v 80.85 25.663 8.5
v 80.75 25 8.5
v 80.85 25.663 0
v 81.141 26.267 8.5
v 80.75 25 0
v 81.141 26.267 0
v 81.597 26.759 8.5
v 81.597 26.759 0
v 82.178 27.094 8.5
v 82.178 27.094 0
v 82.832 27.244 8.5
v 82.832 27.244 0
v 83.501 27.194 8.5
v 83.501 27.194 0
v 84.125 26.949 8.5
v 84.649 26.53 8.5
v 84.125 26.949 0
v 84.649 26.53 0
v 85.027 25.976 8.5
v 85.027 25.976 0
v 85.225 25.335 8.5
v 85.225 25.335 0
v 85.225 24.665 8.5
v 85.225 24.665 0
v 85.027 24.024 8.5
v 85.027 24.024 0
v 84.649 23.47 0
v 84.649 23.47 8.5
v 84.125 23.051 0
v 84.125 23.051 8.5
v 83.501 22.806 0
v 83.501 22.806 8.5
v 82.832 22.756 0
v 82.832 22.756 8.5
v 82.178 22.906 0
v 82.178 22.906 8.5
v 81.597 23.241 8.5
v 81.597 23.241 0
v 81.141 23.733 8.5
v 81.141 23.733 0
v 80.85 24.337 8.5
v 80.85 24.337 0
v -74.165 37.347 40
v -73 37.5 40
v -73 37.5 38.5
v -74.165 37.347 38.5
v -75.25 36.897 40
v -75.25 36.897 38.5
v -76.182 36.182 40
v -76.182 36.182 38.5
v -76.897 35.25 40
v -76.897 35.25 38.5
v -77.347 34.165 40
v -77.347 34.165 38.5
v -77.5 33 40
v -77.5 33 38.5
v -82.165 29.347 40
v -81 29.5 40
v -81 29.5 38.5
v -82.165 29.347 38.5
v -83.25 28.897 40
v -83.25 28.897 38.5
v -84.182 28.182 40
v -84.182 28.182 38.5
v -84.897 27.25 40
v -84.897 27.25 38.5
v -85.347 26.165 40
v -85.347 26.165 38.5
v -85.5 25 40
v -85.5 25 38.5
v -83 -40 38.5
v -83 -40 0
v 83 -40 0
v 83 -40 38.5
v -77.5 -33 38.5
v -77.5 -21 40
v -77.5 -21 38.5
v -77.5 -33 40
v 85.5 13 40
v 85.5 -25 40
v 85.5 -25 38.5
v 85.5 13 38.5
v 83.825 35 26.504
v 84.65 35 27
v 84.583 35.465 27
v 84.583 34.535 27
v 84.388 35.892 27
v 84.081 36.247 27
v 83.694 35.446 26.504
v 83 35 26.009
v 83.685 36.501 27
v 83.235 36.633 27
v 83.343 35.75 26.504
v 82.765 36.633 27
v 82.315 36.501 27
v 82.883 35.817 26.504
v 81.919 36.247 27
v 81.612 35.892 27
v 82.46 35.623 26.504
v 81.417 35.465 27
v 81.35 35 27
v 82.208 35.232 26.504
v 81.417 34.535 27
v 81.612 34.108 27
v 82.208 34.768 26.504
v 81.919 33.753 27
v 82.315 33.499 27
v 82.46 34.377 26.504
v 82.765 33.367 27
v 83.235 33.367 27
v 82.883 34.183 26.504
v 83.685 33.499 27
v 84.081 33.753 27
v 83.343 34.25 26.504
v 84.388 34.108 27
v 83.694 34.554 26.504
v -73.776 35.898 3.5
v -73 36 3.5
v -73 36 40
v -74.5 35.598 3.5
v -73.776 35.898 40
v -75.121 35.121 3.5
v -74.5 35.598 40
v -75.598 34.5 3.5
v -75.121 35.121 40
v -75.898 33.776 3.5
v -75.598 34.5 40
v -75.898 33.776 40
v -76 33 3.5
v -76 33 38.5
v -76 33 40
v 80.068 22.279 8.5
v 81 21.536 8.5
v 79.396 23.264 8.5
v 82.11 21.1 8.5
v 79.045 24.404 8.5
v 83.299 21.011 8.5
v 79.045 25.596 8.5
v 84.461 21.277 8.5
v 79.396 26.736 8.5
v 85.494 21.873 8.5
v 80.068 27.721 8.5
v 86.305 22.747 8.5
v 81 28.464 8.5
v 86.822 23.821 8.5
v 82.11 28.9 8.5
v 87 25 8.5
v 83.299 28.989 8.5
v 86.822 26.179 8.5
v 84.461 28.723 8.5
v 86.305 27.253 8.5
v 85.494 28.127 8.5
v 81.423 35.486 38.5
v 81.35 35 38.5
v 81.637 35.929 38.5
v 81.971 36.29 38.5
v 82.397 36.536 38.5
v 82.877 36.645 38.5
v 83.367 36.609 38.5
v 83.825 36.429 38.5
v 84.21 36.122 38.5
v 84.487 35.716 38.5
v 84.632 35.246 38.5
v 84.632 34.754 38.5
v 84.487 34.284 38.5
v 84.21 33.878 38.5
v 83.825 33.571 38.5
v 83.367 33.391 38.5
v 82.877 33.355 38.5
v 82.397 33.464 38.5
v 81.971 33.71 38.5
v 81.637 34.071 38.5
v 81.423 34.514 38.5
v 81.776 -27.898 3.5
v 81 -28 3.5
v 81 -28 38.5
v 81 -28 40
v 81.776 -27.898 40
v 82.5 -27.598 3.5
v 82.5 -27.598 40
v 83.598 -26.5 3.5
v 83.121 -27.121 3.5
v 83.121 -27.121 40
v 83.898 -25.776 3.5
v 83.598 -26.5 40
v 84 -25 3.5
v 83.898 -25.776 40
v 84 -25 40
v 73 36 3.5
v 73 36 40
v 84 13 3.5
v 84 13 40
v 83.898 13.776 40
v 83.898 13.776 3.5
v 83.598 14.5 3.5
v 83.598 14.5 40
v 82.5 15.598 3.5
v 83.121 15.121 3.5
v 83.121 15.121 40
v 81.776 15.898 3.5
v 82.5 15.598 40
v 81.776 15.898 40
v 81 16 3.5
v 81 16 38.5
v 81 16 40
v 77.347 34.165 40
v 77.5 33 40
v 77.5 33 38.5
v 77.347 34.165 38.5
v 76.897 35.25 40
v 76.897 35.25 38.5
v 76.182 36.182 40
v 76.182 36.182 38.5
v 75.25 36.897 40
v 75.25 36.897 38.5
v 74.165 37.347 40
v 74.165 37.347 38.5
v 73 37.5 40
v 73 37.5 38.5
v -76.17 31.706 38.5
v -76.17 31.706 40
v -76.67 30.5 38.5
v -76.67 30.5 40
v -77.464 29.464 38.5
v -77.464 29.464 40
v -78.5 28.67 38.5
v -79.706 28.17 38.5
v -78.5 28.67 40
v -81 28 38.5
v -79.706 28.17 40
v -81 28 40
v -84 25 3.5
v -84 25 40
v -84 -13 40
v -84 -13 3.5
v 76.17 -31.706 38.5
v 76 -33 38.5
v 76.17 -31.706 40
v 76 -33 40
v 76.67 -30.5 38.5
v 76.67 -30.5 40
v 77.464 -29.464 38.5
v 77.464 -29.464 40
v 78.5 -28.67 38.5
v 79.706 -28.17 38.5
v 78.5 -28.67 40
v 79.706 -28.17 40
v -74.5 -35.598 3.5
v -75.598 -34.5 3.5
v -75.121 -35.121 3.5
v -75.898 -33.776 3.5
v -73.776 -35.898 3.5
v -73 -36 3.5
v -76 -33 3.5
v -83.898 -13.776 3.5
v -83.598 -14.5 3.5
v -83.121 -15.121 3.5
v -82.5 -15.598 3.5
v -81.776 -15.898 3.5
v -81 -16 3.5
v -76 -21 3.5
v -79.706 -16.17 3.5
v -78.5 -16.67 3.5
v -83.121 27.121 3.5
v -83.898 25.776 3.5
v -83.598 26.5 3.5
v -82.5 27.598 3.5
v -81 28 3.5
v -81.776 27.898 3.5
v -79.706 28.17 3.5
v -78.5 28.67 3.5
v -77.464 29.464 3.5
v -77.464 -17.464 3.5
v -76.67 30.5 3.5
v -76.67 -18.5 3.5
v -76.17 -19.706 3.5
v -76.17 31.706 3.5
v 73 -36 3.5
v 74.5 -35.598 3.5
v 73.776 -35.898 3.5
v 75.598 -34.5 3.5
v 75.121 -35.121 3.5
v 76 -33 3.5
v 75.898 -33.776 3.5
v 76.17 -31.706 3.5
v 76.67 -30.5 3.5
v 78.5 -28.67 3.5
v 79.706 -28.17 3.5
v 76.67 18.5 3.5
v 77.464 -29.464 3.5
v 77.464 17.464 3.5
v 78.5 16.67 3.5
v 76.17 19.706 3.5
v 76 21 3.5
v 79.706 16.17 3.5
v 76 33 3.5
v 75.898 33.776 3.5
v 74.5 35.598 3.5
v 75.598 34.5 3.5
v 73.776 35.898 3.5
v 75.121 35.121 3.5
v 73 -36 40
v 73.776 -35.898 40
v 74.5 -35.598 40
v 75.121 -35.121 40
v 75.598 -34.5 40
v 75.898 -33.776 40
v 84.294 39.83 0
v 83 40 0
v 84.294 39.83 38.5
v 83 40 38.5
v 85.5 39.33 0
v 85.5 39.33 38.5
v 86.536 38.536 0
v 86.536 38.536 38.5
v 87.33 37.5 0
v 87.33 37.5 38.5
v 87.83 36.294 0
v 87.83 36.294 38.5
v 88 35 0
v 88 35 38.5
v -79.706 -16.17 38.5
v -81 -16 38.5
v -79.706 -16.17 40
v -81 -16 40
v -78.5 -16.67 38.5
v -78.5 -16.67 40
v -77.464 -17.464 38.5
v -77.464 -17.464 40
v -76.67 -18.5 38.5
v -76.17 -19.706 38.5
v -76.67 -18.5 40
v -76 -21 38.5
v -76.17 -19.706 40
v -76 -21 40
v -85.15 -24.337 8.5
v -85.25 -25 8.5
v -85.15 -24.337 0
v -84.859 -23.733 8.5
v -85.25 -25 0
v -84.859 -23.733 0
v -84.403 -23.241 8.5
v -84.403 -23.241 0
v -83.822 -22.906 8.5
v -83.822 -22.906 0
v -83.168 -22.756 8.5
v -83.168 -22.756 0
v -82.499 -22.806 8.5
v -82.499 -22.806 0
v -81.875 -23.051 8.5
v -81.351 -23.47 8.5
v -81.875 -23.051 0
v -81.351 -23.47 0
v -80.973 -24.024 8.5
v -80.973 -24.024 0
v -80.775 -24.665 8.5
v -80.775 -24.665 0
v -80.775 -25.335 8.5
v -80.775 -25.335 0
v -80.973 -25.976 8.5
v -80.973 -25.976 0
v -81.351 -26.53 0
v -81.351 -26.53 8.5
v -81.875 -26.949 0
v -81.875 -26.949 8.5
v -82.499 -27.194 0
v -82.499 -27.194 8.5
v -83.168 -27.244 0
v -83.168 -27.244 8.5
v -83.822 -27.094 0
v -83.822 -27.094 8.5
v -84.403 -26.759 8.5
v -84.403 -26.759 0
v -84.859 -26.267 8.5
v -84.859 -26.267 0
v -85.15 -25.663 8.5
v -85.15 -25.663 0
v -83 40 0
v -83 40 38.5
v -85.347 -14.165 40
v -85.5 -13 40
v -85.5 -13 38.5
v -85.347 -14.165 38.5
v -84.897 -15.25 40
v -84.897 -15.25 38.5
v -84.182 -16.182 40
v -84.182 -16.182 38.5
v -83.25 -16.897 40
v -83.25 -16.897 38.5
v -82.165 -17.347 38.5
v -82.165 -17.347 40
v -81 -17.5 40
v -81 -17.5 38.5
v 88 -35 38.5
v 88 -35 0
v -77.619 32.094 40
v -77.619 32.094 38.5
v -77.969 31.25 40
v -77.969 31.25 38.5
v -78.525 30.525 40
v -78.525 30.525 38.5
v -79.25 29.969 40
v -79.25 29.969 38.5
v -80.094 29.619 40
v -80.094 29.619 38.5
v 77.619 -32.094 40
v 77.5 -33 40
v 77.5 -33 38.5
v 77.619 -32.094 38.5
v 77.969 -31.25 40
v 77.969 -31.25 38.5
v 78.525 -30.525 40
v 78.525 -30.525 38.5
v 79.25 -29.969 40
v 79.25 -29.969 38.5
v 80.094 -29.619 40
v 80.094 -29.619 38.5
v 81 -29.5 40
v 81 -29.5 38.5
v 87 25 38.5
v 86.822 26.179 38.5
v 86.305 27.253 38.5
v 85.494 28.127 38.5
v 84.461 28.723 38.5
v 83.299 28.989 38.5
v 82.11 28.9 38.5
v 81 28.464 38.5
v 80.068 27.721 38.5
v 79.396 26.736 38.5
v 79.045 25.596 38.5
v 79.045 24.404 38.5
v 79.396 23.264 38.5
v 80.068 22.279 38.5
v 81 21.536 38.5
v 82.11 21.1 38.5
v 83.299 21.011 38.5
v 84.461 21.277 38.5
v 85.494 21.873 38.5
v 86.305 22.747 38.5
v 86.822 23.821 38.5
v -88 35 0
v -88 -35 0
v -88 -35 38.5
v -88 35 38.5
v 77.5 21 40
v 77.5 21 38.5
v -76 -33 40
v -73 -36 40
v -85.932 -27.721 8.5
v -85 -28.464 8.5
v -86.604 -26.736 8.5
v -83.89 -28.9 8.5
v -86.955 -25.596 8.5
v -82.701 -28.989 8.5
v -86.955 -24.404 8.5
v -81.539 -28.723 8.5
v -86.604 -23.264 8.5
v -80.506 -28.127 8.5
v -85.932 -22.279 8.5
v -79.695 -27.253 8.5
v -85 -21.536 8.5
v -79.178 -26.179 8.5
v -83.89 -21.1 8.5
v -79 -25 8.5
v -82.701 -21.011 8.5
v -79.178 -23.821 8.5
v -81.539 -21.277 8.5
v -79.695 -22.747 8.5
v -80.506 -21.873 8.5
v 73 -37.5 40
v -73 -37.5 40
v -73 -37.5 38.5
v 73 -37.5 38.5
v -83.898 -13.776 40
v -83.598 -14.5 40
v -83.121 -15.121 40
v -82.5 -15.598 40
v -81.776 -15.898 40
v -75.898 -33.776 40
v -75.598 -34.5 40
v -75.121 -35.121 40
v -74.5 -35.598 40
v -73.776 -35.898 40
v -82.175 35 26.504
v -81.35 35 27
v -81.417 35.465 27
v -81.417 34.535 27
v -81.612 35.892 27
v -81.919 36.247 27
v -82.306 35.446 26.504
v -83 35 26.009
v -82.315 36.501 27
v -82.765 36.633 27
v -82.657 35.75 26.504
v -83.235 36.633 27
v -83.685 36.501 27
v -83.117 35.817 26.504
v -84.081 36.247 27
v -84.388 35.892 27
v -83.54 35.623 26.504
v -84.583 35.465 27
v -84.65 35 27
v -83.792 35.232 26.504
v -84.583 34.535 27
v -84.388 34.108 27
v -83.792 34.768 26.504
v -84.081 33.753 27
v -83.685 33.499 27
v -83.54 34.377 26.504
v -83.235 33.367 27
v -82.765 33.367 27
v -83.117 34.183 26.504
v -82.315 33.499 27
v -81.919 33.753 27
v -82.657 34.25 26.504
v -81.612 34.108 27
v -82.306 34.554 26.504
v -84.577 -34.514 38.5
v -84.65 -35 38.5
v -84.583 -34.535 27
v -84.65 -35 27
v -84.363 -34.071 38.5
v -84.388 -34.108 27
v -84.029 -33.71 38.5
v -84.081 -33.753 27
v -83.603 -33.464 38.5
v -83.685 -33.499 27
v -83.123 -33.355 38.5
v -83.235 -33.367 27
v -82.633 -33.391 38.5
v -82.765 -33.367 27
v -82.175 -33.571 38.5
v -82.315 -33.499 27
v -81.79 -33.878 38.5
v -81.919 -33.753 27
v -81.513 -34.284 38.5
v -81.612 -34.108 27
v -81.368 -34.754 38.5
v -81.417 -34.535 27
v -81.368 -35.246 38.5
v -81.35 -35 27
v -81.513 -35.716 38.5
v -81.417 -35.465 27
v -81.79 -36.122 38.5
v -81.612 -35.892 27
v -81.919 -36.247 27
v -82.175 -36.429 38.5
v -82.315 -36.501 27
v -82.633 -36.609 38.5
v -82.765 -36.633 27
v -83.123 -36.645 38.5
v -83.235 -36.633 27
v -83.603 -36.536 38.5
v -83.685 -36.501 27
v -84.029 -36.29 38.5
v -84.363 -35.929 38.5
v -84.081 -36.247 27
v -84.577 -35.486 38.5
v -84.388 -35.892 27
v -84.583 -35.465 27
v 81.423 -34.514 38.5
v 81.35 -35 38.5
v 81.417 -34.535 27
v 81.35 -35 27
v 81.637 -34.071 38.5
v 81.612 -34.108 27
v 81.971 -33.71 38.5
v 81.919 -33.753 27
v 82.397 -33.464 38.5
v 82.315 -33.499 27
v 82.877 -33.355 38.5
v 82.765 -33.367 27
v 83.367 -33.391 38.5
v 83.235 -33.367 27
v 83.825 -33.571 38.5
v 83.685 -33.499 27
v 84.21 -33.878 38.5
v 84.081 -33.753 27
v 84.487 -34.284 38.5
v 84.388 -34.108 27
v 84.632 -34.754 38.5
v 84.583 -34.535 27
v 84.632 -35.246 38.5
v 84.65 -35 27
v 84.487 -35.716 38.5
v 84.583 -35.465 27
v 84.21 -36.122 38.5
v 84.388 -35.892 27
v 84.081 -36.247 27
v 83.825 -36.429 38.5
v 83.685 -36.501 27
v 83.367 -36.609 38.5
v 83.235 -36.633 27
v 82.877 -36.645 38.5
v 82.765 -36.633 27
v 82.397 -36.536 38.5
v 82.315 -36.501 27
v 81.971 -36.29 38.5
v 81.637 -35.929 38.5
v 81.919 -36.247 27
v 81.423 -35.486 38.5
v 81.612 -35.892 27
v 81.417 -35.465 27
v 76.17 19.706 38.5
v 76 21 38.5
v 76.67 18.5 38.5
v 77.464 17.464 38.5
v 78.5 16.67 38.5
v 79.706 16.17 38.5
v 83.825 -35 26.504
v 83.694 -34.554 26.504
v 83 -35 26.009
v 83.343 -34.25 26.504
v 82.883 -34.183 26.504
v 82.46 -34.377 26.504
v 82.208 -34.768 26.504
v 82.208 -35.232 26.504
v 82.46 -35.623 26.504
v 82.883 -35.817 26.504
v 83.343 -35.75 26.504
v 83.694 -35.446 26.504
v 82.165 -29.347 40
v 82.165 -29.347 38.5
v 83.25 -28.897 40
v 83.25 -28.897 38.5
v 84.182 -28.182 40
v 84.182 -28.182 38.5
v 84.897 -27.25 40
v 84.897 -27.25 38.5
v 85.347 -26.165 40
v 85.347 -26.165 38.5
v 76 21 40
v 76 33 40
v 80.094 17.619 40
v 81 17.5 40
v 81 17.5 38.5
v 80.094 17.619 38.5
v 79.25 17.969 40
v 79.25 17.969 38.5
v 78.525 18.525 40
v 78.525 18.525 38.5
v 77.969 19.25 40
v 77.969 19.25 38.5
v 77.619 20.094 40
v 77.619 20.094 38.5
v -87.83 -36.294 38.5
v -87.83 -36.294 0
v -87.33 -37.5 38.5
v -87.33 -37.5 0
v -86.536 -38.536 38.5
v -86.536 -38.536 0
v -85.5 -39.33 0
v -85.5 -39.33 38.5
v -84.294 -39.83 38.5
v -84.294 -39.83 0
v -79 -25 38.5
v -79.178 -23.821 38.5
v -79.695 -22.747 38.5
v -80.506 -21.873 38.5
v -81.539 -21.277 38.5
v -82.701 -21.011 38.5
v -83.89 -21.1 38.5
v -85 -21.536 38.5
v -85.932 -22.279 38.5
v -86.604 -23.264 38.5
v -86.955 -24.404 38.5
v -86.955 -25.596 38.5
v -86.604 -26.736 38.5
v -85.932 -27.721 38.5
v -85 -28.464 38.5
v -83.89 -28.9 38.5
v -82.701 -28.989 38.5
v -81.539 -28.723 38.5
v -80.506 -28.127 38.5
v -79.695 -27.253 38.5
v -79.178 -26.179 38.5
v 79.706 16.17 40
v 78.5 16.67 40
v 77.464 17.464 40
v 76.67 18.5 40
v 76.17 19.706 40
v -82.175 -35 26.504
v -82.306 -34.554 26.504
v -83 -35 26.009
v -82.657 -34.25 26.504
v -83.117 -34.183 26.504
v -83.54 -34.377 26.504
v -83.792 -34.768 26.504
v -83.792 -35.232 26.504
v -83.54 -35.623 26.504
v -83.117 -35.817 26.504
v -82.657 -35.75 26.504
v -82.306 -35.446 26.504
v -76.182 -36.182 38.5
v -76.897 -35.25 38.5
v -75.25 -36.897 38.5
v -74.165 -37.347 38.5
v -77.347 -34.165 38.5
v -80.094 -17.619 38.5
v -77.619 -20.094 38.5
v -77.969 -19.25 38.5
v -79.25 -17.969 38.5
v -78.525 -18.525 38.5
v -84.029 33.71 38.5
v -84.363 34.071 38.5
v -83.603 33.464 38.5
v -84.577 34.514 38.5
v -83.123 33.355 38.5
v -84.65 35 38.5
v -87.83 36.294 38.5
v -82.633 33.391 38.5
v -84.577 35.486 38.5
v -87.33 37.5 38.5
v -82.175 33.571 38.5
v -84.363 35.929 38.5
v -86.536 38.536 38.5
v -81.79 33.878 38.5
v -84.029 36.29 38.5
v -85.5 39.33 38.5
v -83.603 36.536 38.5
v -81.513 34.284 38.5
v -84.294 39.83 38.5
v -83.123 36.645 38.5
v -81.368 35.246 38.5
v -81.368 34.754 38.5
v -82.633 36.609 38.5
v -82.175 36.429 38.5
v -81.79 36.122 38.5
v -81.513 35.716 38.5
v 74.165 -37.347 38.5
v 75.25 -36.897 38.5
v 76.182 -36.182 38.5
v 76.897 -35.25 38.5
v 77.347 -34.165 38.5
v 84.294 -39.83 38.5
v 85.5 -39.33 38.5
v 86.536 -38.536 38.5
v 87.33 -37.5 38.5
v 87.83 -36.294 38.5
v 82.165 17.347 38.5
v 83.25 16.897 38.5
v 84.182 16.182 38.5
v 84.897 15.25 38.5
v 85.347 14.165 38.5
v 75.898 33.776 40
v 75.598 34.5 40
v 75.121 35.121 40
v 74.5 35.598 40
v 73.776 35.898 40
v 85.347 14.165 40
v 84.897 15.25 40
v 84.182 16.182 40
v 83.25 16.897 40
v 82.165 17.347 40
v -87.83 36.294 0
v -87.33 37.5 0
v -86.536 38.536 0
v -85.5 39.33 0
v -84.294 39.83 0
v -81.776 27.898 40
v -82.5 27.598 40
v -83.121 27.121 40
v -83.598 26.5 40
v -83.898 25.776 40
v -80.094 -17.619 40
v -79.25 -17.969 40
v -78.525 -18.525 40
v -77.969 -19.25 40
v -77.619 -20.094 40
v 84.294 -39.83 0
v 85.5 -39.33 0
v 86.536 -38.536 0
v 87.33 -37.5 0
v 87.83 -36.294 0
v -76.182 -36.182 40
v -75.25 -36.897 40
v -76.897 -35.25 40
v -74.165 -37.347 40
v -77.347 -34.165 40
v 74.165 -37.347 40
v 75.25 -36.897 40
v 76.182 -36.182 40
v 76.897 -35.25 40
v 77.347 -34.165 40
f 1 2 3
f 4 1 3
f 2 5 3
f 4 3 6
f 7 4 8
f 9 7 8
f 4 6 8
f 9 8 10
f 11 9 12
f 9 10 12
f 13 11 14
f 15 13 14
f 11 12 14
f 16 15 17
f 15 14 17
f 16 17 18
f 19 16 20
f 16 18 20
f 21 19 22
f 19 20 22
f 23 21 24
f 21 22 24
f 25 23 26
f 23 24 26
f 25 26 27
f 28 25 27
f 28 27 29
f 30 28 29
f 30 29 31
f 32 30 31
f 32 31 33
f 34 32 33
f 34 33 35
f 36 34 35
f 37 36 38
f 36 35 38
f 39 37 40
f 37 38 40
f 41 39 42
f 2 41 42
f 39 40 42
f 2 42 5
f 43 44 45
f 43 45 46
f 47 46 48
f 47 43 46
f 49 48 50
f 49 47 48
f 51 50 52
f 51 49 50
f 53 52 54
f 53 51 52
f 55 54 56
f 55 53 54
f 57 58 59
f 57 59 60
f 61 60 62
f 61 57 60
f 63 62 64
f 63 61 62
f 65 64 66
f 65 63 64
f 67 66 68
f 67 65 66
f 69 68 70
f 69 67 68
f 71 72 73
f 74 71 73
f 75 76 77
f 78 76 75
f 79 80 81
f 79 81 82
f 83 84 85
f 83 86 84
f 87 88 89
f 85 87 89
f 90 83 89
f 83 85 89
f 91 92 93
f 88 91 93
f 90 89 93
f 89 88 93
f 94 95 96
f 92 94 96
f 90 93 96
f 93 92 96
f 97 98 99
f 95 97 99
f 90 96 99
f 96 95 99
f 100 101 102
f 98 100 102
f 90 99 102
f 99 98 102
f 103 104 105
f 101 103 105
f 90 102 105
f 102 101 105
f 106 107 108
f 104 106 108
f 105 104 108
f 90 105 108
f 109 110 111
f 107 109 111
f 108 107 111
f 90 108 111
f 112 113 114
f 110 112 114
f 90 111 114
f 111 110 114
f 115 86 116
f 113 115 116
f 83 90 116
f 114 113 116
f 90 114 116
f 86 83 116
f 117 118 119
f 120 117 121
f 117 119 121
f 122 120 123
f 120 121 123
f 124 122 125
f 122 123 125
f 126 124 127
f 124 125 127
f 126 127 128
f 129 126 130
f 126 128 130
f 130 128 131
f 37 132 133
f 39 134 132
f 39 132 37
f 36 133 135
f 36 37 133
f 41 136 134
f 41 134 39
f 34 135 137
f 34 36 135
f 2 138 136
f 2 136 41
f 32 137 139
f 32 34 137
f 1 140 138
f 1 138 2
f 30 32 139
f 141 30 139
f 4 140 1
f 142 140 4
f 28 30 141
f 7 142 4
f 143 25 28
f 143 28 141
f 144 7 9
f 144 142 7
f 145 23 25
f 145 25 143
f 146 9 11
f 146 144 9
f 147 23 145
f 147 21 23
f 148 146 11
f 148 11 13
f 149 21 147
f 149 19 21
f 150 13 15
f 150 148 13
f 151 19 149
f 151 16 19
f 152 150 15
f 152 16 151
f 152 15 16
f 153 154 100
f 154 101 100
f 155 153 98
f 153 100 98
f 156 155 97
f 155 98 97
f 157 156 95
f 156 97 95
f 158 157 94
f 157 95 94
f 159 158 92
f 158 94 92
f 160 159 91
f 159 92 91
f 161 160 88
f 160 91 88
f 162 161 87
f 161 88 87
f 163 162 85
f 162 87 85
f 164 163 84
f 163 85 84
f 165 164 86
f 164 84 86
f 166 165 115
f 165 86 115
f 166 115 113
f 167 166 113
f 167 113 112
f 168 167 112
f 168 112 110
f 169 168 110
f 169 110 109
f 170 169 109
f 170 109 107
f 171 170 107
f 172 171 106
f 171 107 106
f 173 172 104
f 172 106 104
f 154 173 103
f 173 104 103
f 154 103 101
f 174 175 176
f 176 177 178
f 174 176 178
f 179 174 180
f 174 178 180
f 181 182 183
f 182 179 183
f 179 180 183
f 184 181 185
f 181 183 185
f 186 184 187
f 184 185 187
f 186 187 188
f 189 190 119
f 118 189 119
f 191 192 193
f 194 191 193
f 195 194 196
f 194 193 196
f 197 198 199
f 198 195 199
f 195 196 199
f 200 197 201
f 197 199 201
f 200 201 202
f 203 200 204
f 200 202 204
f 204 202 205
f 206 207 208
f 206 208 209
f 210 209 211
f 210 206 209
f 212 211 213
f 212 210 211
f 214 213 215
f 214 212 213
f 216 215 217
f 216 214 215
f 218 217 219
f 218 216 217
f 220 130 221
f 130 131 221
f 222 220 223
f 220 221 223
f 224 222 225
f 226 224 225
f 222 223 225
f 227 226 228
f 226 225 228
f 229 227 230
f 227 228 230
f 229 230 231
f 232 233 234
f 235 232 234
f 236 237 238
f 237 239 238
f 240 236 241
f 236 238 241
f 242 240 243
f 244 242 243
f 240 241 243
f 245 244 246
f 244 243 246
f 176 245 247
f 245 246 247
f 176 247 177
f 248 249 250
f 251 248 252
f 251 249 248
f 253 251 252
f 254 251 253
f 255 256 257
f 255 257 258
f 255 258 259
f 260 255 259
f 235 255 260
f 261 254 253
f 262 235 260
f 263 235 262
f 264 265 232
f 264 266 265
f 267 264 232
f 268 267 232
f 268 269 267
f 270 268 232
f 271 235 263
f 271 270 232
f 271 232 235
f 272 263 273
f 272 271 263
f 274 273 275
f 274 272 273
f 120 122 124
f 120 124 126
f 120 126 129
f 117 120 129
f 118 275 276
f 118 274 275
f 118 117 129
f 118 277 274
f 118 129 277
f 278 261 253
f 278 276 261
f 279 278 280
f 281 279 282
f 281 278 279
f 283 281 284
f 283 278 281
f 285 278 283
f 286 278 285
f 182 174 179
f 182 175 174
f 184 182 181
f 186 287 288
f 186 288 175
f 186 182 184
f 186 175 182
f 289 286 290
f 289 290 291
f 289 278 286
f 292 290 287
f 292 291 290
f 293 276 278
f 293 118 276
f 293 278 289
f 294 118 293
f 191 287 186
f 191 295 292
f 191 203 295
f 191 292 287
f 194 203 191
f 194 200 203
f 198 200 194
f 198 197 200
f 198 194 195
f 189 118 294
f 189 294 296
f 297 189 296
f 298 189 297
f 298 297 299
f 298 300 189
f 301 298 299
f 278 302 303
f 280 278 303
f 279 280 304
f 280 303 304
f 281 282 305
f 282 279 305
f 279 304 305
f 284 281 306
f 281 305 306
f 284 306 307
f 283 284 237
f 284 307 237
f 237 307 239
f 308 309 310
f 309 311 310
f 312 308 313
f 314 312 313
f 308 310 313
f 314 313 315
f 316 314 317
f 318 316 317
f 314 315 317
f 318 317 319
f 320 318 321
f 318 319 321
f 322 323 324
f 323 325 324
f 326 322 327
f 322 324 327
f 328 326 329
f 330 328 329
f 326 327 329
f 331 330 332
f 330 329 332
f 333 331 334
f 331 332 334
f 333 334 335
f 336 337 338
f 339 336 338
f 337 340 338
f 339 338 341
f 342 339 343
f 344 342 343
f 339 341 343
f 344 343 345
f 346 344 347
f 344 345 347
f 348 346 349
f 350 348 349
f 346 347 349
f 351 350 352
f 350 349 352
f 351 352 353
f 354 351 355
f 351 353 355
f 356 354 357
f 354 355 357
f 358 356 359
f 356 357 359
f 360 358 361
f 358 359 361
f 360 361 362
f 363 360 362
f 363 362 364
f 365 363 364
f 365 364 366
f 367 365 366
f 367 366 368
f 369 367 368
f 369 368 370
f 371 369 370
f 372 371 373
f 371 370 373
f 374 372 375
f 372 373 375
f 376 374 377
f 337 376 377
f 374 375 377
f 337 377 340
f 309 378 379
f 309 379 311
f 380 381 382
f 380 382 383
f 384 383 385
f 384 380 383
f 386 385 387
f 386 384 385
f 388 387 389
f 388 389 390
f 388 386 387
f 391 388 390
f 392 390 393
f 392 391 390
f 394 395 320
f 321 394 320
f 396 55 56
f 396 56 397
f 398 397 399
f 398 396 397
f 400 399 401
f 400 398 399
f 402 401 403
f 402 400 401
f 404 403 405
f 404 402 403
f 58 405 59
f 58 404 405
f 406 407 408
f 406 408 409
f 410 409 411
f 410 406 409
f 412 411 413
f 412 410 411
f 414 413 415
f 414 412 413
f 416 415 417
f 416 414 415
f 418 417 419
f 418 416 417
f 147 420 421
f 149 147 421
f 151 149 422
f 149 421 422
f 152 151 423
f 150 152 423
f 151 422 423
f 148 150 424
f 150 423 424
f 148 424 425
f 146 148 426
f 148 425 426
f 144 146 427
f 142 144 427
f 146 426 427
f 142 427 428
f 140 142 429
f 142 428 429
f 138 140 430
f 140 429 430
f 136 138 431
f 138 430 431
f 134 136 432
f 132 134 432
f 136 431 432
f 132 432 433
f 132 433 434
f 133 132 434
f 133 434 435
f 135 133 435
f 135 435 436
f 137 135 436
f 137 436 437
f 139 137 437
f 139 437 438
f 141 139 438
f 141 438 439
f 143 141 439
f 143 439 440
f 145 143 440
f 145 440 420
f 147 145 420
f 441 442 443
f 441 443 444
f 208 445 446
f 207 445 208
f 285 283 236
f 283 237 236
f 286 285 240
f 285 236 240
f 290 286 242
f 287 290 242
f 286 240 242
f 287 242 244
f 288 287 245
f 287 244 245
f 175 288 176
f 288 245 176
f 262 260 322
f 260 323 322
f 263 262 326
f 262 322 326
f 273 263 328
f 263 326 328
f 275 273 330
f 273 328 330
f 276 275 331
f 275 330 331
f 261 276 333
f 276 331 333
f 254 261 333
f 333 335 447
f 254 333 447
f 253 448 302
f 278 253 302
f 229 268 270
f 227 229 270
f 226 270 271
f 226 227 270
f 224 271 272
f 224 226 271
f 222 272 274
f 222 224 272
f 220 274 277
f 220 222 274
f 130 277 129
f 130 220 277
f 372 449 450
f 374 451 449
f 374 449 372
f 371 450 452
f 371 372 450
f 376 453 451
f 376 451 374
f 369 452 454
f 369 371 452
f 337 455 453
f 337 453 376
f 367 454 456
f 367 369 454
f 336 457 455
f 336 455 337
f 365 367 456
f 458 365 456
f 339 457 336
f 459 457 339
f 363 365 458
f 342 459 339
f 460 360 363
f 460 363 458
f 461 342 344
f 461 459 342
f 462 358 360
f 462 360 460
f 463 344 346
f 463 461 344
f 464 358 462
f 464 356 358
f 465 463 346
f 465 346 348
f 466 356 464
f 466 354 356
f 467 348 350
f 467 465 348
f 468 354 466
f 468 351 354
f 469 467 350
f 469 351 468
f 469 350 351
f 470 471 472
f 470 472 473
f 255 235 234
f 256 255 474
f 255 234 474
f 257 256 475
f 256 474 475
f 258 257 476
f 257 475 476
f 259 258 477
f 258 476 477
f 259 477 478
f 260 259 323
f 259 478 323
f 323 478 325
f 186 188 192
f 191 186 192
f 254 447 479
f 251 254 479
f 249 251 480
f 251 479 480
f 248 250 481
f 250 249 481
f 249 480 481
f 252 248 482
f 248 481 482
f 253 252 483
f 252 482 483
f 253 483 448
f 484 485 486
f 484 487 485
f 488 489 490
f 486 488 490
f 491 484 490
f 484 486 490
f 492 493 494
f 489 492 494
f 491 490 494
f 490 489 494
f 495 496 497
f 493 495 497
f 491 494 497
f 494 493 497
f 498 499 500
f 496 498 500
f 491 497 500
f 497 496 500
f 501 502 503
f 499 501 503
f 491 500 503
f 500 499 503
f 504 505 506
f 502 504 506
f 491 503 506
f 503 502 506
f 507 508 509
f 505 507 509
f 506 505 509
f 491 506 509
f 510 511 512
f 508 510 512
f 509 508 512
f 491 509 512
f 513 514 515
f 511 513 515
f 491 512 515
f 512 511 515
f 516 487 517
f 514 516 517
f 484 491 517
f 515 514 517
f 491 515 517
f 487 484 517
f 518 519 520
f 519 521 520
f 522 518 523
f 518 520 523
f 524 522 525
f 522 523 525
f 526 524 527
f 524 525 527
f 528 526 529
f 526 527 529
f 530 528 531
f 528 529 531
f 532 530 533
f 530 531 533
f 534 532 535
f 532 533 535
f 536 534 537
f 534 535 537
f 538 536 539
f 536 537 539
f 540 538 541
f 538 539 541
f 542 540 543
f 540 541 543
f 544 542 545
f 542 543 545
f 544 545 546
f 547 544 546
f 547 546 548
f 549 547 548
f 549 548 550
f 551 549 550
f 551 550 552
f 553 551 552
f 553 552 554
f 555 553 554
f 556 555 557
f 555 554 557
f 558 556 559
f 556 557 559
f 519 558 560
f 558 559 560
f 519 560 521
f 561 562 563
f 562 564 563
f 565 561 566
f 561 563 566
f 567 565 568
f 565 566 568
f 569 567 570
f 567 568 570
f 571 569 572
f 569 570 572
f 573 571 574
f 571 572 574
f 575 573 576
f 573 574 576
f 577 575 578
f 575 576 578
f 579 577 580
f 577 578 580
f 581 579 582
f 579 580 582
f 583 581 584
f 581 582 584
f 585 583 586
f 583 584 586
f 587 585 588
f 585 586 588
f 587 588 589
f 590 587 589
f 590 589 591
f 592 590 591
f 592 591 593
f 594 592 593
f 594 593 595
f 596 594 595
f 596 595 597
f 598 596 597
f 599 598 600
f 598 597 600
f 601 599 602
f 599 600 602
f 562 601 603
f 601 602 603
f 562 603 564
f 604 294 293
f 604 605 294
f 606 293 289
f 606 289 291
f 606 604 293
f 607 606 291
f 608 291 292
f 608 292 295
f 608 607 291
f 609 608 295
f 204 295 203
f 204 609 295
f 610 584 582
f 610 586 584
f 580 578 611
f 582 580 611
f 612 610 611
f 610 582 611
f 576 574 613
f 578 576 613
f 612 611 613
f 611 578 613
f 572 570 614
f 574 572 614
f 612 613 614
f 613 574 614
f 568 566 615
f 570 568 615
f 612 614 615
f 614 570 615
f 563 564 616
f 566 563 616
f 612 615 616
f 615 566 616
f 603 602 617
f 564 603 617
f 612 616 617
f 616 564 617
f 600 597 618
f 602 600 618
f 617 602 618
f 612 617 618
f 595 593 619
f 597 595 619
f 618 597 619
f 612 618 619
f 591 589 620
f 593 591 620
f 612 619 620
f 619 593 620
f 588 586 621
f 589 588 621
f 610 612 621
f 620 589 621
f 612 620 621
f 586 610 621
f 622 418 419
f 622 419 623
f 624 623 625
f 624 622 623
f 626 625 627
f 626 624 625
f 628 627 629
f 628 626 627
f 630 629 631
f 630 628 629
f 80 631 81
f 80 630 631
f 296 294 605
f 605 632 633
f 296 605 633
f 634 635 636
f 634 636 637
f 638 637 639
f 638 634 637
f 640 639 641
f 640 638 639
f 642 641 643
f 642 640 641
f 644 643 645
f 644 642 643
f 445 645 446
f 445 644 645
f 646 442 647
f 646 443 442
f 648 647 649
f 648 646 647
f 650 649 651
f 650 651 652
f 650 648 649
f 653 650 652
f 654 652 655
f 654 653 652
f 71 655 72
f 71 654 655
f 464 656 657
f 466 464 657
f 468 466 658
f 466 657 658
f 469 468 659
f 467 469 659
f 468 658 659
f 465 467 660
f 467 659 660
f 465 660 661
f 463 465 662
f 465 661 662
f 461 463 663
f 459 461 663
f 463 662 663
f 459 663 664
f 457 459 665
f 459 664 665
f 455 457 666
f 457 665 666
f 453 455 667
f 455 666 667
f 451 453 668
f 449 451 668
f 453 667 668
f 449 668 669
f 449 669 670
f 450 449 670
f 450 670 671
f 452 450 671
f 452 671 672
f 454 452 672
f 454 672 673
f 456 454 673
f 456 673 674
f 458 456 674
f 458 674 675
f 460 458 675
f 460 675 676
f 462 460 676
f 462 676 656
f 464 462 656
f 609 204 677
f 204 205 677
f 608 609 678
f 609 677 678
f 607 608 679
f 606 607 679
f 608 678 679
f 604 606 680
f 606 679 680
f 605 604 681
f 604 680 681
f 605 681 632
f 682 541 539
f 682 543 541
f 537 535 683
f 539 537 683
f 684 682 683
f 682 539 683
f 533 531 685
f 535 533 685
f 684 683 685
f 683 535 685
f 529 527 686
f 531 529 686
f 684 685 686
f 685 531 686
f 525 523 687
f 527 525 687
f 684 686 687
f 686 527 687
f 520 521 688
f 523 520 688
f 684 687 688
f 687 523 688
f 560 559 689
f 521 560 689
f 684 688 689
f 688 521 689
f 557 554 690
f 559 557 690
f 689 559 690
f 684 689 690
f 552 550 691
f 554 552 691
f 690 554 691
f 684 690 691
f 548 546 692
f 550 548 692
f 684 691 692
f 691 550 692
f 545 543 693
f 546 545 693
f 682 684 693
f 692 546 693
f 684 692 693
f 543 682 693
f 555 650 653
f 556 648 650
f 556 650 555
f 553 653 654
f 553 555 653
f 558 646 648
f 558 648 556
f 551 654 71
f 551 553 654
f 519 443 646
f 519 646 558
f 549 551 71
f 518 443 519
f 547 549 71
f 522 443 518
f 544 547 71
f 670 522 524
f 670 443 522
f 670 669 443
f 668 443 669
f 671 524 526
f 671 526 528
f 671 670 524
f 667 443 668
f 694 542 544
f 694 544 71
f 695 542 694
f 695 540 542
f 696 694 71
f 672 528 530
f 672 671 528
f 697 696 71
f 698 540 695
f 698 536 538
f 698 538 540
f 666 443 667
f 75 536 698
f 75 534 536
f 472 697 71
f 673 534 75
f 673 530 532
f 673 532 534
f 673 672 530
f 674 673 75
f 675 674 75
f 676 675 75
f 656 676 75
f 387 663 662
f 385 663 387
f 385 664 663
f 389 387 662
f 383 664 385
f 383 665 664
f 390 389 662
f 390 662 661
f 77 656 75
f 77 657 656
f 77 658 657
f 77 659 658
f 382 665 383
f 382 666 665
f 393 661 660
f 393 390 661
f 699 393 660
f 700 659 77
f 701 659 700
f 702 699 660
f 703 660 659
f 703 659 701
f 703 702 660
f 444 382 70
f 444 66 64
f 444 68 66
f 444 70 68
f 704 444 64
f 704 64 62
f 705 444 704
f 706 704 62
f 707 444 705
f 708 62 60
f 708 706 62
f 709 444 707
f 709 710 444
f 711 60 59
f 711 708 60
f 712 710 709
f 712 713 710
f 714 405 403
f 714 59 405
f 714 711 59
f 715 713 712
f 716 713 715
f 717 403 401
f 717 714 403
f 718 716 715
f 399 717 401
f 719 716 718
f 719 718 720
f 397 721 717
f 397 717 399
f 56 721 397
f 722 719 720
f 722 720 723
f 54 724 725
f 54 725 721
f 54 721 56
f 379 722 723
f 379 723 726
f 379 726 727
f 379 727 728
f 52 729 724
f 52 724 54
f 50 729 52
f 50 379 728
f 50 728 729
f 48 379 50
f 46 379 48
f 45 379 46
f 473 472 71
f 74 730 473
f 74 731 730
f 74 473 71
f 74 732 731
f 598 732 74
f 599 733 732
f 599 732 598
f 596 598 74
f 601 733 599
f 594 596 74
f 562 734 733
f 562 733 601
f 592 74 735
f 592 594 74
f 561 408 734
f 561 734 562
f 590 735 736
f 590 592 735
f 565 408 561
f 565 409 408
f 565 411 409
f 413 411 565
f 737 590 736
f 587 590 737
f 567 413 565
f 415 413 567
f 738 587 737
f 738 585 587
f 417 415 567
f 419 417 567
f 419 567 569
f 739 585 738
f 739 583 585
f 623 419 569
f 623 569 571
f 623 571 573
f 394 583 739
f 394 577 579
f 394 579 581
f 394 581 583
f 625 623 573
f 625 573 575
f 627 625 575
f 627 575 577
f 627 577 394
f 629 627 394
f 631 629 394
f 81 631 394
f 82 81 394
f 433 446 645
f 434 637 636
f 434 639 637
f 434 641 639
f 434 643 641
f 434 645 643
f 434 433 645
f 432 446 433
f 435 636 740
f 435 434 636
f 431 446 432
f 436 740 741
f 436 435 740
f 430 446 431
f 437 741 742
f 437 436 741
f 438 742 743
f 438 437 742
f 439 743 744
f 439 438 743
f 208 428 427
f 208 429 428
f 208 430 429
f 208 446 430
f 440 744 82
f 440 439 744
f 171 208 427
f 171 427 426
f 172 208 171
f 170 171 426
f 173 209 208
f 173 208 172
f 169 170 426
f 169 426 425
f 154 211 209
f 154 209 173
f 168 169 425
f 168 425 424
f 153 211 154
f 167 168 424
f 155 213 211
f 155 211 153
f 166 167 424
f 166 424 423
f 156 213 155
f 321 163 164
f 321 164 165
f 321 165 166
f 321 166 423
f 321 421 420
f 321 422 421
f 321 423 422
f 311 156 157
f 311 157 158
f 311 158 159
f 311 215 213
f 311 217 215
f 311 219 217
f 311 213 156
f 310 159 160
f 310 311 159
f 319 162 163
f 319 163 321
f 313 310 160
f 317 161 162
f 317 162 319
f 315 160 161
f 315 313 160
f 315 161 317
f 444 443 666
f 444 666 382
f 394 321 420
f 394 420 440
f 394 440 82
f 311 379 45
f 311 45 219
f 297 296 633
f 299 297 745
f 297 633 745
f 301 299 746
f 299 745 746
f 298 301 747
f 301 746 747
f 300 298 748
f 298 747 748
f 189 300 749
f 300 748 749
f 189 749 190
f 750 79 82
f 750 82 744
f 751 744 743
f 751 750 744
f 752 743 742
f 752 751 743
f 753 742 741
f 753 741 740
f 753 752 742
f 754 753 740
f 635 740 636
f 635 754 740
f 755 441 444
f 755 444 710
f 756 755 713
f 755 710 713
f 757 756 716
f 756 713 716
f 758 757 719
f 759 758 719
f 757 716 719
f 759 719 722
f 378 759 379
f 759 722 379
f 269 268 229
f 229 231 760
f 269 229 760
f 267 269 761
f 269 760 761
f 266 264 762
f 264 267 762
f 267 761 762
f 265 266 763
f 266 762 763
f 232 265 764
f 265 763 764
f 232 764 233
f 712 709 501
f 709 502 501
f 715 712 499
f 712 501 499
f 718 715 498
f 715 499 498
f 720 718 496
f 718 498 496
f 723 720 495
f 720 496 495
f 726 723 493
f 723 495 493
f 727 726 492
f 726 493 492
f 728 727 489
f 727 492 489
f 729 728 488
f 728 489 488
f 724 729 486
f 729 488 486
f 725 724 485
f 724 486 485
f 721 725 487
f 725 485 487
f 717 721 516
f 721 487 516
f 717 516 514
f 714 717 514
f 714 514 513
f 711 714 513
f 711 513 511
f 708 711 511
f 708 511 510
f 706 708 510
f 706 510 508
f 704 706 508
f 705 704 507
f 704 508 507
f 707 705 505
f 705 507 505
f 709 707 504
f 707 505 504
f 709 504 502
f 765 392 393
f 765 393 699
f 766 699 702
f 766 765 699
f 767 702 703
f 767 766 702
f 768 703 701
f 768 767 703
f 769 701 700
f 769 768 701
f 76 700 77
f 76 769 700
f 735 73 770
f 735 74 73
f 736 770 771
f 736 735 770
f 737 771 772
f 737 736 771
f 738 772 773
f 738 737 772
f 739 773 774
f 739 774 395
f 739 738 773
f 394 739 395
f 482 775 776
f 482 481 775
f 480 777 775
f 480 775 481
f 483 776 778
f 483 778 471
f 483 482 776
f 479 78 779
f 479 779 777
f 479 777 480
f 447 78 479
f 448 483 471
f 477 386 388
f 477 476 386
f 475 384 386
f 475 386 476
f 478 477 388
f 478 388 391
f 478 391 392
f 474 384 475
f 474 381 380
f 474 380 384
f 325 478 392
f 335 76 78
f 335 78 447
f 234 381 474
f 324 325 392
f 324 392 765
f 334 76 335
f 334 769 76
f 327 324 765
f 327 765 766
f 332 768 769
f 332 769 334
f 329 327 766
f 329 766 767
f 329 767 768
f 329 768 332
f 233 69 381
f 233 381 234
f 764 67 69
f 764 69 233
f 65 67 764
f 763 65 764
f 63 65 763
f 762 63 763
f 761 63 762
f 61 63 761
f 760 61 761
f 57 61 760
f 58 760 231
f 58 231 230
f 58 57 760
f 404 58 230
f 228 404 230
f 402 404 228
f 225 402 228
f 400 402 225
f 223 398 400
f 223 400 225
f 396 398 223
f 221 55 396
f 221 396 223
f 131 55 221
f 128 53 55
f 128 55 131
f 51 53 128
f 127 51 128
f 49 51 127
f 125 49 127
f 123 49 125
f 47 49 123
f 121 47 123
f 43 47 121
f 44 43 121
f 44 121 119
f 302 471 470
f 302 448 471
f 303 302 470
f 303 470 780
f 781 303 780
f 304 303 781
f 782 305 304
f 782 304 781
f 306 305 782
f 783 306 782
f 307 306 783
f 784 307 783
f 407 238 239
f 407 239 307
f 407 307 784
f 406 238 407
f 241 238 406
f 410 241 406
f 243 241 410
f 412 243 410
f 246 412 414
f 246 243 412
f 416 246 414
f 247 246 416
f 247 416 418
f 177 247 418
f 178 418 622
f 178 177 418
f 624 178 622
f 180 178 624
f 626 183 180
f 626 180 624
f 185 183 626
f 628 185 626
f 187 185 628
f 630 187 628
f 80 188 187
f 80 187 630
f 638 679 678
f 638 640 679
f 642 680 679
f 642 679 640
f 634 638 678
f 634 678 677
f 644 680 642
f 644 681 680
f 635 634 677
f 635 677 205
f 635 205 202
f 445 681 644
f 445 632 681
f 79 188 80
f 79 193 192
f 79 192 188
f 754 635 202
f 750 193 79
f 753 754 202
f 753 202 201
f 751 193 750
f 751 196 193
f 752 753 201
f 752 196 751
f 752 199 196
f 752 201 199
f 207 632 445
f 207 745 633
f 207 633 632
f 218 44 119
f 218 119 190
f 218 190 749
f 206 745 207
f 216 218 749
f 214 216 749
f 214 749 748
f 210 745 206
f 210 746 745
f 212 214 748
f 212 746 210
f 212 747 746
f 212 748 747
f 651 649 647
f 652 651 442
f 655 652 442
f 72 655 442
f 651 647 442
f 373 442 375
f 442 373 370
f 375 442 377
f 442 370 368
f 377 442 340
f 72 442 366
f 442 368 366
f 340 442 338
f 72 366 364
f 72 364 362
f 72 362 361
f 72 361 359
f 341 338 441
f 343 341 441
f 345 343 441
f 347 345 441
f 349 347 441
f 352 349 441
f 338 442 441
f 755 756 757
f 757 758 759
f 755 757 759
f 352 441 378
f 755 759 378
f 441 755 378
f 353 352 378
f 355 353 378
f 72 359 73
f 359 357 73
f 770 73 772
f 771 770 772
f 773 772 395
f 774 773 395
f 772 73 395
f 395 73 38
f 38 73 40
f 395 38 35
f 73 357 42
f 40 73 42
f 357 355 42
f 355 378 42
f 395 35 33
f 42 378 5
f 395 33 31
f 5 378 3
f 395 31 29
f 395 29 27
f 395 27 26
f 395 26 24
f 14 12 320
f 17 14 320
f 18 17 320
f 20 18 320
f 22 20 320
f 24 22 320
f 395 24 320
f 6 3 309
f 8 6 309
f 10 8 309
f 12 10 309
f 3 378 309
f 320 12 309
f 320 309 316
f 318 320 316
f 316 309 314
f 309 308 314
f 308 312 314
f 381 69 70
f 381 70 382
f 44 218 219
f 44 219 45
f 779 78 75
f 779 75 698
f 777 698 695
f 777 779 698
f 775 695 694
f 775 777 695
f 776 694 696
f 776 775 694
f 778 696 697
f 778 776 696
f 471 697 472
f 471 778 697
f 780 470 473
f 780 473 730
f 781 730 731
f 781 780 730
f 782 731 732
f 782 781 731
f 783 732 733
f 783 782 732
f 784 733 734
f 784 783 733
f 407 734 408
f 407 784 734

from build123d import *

# Parameters (mm, degrees)
SKETCH1_W                                   = 176
SKETCH1_H                                   = 80
BOSS_EXTRUDE1_DEPTH                         = 38.5
SKETCH2_W                                   = 168
SKETCH2_H                                   = 72
CUT_EXTRUDE1_DEPTH                          = 35
FILLET2_R                                   = 5
SKETCH8_W                                   = 8
SKETCH8_H                                   = 20
SKETCH8_H_2                                 = 8
BOSS_EXTRUDE2_DEPTH                         = 35
FILLET4_R                                   = 3
FILLET5_R                                   = 5
M4_TAPPED_HOLE1_D                           = 3.3
M4_TAPPED_HOLE1_DEPTH                       = 11.5
M4_TAPPED_HOLE1_TIP                         = 0.991420021
BOSS_EXTRUDE3_START                         = 1.5
BOSS_EXTRUDE3_DEPTH                         = 1.5
CBORE_FOR_M4_CHEESE_HEAD_SCREW1_D           = 4.5
CBORE_FOR_M4_CHEESE_HEAD_SCREW1_CBORE_D     = 8
CBORE_FOR_M4_CHEESE_HEAD_SCREW1_CBORE_DEPTH = 30


with BuildPart() as part:
    # Sketch1 → Boss-Extrude1 (new body)
    with BuildSketch(Plane.XY):
        Rectangle(SKETCH1_W, SKETCH1_H)
    extrude(amount=BOSS_EXTRUDE1_DEPTH)

    # Sketch2 → Cut-Extrude1 (cut)
    with BuildSketch(Plane.XY.offset(38.5)):
        Rectangle(SKETCH2_W, SKETCH2_H)
    extrude(amount=-CUT_EXTRUDE1_DEPTH, mode=Mode.SUBTRACT)

    # Fillet2
    fillet2_edges = [part.edges().sort_by_distance(p)[0] for p in [
        (-88, 40, 19.25),
        (88, 40, 19.25),
        (88, -40, 19.25),
        (-88, -40, 19.25),
    ]]
    fillet(fillet2_edges, radius=FILLET2_R)

    # Sketch8 → Boss-Extrude2 (add)
    with BuildSketch(Plane.XY.offset(3.5)):
        with Locations((80, 26)):
            Rectangle(SKETCH8_W, SKETCH8_H)
        with Locations((80, -32)):
            Rectangle(SKETCH8_W, SKETCH8_H_2)
        with Locations((-80, -26)):
            Rectangle(SKETCH8_W, SKETCH8_H)
        with Locations((-80, 32)):
            Rectangle(SKETCH8_W, SKETCH8_H_2)
    extrude(amount=BOSS_EXTRUDE2_DEPTH)

    # Fillet4
    fillet4_edges = [part.edges().sort_by_distance(p)[0] for p in [
        (76, 36, 21),
        (84, 16, 21),
        (84, -28, 21),
        (76, -36, 21),
        (-76, -36, 21),
        (-84, -16, 21),
        (-84, 28, 21),
        (-76, 36, 21),
    ]]
    fillet(fillet4_edges, radius=FILLET4_R)

    # Fillet5
    fillet5_edges = [part.edges().sort_by_distance(p)[0] for p in [
        (-76, -16, 21),
        (76, -28, 21),
        (76, 16, 21),
        (-76, 28, 21),
    ]]
    fillet(fillet5_edges, radius=FILLET5_R - 0.0001)  # a hair under: the kernel refuses the full size

    # M4 Tapped Hole1
    with Locations(Plane.XY.offset(38.5)):
        with Locations((-83, -35), (83, 35), (-83, 35), (83, -35)):
            Hole(M4_TAPPED_HOLE1_D / 2, depth=M4_TAPPED_HOLE1_DEPTH)
            with Locations((0, 0, -(M4_TAPPED_HOLE1_DEPTH + M4_TAPPED_HOLE1_TIP / 2))):  # 118° drill point
                Cone(0, M4_TAPPED_HOLE1_D / 2, M4_TAPPED_HOLE1_TIP, mode=Mode.SUBTRACT)

    # Sketch9 → Boss-Extrude3 (add)
    with BuildSketch(Plane.XY.offset(38.5).offset(BOSS_EXTRUDE3_START)):
        with BuildLine():
            Line((73, 37.5), (-73, 37.5))
            ThreePointArc((-73, 37.5), (-76.181980515, 36.181980515), (-77.5, 33))
            ThreePointArc((-77.5, 33), (-78.525126266, 30.525126266), (-81, 29.5))
            ThreePointArc((-81, 29.5), (-84.181980515, 28.181980515), (-85.5, 25))
            Line((-85.5, 25), (-85.5, -13))
            ThreePointArc((-85.5, -13), (-84.181980515, -16.181980515), (-81, -17.5))
            ThreePointArc((-81, -17.5), (-78.525126266, -18.525126266), (-77.5, -21))
            Line((-77.5, -21), (-77.5, -33))
            ThreePointArc((-77.5, -33), (-76.181980515, -36.181980515), (-73, -37.5))
            Line((-73, -37.5), (73, -37.5))
            ThreePointArc((73, -37.5), (76.181980515, -36.181980515), (77.5, -33))
            ThreePointArc((77.5, -33), (78.525126266, -30.525126266), (81, -29.5))
            ThreePointArc((81, -29.5), (84.181980515, -28.181980515), (85.5, -25))
            Line((85.5, -25), (85.5, 13))
            ThreePointArc((85.5, 13), (84.181980515, 16.181980515), (81, 17.5))
            ThreePointArc((81, 17.5), (78.525126266, 18.525126266), (77.5, 21))
            Line((77.5, 21), (77.5, 33))
            ThreePointArc((77.5, 33), (76.181980515, 36.181980515), (73, 37.5))
        make_face()
        with BuildLine():
            Line((73, 36), (-73, 36))
            ThreePointArc((-73, 36), (-75.121320344, 35.121320344), (-76, 33))
            ThreePointArc((-76, 33), (-77.464466094, 29.464466094), (-81, 28))
            ThreePointArc((-81, 28), (-83.121320344, 27.121320344), (-84, 25))
            Line((-84, 25), (-84, -13))
            ThreePointArc((-84, -13), (-83.121320344, -15.121320344), (-81, -16))
            ThreePointArc((-81, -16), (-77.464466094, -17.464466094), (-76, -21))
            Line((-76, -21), (-76, -33))
            ThreePointArc((-76, -33), (-75.121320344, -35.121320344), (-73, -36))
            Line((-73, -36), (73, -36))
            ThreePointArc((73, -36), (75.121320344, -35.121320344), (76, -33))
            ThreePointArc((76, -33), (77.464466094, -29.464466094), (81, -28))
            ThreePointArc((81, -28), (83.121320344, -27.121320344), (84, -25))
            Line((84, -25), (84, 13))
            ThreePointArc((84, 13), (83.121320344, 15.121320344), (81, 16))
            ThreePointArc((81, 16), (77.464466094, 17.464466094), (76, 21))
            Line((76, 21), (76, 33))
            ThreePointArc((76, 33), (75.121320344, 35.121320344), (73, 36))
        make_face(mode=Mode.SUBTRACT)
    extrude(amount=-BOSS_EXTRUDE3_DEPTH)

    # CBORE for M4 Cheese Head Screw1 (through all)
    with Locations(Plane.XY.offset(38.5)):
        with Locations((83, 25), (-83, -25)):
            CounterBoreHole(CBORE_FOR_M4_CHEESE_HEAD_SCREW1_D / 2, CBORE_FOR_M4_CHEESE_HEAD_SCREW1_CBORE_D / 2, CBORE_FOR_M4_CHEESE_HEAD_SCREW1_CBORE_DEPTH)


solid = part.part
